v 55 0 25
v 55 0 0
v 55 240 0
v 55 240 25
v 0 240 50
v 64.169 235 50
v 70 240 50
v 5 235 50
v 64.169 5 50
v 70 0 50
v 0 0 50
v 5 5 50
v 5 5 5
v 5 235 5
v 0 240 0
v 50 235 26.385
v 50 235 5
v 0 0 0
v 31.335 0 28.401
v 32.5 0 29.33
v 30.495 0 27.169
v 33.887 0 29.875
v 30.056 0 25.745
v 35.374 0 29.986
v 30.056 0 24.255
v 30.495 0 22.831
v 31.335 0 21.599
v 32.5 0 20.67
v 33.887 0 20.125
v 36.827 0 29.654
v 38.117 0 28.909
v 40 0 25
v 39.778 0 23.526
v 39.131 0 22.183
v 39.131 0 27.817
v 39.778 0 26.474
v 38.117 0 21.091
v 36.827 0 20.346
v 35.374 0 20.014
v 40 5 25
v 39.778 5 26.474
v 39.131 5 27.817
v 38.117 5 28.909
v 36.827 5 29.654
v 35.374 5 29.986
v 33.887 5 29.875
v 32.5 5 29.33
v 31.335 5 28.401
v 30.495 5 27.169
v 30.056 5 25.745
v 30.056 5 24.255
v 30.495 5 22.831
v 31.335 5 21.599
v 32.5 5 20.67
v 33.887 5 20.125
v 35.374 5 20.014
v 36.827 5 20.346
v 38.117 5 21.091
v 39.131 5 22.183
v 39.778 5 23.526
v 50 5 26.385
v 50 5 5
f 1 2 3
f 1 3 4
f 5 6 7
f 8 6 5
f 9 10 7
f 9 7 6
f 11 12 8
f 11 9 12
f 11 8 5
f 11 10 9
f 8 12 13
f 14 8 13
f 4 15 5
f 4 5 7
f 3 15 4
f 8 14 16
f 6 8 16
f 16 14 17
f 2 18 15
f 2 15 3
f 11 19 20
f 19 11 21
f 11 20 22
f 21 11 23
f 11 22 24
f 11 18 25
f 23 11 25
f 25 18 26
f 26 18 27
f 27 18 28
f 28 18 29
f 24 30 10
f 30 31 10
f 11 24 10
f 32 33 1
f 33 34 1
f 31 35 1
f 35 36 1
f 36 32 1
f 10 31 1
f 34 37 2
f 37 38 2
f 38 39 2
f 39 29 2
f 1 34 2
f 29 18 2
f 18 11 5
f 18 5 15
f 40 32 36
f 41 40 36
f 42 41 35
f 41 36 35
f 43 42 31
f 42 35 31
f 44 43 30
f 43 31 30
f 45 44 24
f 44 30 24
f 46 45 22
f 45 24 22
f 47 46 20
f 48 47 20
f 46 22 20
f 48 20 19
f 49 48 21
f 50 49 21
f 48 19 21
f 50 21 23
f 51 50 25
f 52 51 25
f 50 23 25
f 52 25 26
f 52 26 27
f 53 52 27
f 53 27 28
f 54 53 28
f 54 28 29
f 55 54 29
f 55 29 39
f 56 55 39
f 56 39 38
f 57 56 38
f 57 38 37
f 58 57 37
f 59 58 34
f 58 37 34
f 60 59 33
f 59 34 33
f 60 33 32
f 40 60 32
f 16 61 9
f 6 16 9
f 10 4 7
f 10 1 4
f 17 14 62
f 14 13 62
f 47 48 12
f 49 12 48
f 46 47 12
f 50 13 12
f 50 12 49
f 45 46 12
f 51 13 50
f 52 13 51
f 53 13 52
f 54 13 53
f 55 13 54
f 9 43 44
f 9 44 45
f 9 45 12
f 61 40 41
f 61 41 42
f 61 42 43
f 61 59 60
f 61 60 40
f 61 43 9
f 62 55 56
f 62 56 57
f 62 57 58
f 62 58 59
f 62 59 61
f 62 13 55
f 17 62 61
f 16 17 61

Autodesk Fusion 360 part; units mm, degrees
sketch "side" plane through (0, 0, 0) normal (0, 1, 0) x (1, 0, 0)
  line L0 (0, 0) -> (55, 0)
  line L1 (55, 0) -> (55, -25)
  line L2 (55, -25) -> (70, -50)
  line L3 (70, -50) -> (0, -50)
  line L4 (0, -50) -> (0, 0)
  dimension "d1" = 70
  dimension "d2" = 59.036
  dimension "d3" = 50
  dimension "d4" = 25
extrude "Extrude1" add sketch "side" along normal blind 240
shell "Shell1" thickness 5 removed faces 1 at (46.6667, 80, 50)
sketch "actuator hole" plane through (0, 0, 0) normal (0, -1, 0) x (1, 0, 0)
  line L0 (70, 50) -> (0, 50)
  line L1 (0, 50) -> (0, 0)
  line L2 (0, 0) -> (55, 0)
  line L3 (55, 0) -> (55, 25)
  line L4 (55, 25) -> (70, 50)
  circle A0 centre (35, 25) radius 5
  line L5 (35, 50) -> (35, 0)
  line L6 (0, 25) -> (15, 25)
  line L7 (15, 25) -> (55, 25)
  dimension "d8" = 10
extrude "Extrude2" cut sketch "actuator hole" against normal blind 230 contours A0 L5 L7 | A0 L5 L7 | A0 L5 L7 | A0 L5 L7
